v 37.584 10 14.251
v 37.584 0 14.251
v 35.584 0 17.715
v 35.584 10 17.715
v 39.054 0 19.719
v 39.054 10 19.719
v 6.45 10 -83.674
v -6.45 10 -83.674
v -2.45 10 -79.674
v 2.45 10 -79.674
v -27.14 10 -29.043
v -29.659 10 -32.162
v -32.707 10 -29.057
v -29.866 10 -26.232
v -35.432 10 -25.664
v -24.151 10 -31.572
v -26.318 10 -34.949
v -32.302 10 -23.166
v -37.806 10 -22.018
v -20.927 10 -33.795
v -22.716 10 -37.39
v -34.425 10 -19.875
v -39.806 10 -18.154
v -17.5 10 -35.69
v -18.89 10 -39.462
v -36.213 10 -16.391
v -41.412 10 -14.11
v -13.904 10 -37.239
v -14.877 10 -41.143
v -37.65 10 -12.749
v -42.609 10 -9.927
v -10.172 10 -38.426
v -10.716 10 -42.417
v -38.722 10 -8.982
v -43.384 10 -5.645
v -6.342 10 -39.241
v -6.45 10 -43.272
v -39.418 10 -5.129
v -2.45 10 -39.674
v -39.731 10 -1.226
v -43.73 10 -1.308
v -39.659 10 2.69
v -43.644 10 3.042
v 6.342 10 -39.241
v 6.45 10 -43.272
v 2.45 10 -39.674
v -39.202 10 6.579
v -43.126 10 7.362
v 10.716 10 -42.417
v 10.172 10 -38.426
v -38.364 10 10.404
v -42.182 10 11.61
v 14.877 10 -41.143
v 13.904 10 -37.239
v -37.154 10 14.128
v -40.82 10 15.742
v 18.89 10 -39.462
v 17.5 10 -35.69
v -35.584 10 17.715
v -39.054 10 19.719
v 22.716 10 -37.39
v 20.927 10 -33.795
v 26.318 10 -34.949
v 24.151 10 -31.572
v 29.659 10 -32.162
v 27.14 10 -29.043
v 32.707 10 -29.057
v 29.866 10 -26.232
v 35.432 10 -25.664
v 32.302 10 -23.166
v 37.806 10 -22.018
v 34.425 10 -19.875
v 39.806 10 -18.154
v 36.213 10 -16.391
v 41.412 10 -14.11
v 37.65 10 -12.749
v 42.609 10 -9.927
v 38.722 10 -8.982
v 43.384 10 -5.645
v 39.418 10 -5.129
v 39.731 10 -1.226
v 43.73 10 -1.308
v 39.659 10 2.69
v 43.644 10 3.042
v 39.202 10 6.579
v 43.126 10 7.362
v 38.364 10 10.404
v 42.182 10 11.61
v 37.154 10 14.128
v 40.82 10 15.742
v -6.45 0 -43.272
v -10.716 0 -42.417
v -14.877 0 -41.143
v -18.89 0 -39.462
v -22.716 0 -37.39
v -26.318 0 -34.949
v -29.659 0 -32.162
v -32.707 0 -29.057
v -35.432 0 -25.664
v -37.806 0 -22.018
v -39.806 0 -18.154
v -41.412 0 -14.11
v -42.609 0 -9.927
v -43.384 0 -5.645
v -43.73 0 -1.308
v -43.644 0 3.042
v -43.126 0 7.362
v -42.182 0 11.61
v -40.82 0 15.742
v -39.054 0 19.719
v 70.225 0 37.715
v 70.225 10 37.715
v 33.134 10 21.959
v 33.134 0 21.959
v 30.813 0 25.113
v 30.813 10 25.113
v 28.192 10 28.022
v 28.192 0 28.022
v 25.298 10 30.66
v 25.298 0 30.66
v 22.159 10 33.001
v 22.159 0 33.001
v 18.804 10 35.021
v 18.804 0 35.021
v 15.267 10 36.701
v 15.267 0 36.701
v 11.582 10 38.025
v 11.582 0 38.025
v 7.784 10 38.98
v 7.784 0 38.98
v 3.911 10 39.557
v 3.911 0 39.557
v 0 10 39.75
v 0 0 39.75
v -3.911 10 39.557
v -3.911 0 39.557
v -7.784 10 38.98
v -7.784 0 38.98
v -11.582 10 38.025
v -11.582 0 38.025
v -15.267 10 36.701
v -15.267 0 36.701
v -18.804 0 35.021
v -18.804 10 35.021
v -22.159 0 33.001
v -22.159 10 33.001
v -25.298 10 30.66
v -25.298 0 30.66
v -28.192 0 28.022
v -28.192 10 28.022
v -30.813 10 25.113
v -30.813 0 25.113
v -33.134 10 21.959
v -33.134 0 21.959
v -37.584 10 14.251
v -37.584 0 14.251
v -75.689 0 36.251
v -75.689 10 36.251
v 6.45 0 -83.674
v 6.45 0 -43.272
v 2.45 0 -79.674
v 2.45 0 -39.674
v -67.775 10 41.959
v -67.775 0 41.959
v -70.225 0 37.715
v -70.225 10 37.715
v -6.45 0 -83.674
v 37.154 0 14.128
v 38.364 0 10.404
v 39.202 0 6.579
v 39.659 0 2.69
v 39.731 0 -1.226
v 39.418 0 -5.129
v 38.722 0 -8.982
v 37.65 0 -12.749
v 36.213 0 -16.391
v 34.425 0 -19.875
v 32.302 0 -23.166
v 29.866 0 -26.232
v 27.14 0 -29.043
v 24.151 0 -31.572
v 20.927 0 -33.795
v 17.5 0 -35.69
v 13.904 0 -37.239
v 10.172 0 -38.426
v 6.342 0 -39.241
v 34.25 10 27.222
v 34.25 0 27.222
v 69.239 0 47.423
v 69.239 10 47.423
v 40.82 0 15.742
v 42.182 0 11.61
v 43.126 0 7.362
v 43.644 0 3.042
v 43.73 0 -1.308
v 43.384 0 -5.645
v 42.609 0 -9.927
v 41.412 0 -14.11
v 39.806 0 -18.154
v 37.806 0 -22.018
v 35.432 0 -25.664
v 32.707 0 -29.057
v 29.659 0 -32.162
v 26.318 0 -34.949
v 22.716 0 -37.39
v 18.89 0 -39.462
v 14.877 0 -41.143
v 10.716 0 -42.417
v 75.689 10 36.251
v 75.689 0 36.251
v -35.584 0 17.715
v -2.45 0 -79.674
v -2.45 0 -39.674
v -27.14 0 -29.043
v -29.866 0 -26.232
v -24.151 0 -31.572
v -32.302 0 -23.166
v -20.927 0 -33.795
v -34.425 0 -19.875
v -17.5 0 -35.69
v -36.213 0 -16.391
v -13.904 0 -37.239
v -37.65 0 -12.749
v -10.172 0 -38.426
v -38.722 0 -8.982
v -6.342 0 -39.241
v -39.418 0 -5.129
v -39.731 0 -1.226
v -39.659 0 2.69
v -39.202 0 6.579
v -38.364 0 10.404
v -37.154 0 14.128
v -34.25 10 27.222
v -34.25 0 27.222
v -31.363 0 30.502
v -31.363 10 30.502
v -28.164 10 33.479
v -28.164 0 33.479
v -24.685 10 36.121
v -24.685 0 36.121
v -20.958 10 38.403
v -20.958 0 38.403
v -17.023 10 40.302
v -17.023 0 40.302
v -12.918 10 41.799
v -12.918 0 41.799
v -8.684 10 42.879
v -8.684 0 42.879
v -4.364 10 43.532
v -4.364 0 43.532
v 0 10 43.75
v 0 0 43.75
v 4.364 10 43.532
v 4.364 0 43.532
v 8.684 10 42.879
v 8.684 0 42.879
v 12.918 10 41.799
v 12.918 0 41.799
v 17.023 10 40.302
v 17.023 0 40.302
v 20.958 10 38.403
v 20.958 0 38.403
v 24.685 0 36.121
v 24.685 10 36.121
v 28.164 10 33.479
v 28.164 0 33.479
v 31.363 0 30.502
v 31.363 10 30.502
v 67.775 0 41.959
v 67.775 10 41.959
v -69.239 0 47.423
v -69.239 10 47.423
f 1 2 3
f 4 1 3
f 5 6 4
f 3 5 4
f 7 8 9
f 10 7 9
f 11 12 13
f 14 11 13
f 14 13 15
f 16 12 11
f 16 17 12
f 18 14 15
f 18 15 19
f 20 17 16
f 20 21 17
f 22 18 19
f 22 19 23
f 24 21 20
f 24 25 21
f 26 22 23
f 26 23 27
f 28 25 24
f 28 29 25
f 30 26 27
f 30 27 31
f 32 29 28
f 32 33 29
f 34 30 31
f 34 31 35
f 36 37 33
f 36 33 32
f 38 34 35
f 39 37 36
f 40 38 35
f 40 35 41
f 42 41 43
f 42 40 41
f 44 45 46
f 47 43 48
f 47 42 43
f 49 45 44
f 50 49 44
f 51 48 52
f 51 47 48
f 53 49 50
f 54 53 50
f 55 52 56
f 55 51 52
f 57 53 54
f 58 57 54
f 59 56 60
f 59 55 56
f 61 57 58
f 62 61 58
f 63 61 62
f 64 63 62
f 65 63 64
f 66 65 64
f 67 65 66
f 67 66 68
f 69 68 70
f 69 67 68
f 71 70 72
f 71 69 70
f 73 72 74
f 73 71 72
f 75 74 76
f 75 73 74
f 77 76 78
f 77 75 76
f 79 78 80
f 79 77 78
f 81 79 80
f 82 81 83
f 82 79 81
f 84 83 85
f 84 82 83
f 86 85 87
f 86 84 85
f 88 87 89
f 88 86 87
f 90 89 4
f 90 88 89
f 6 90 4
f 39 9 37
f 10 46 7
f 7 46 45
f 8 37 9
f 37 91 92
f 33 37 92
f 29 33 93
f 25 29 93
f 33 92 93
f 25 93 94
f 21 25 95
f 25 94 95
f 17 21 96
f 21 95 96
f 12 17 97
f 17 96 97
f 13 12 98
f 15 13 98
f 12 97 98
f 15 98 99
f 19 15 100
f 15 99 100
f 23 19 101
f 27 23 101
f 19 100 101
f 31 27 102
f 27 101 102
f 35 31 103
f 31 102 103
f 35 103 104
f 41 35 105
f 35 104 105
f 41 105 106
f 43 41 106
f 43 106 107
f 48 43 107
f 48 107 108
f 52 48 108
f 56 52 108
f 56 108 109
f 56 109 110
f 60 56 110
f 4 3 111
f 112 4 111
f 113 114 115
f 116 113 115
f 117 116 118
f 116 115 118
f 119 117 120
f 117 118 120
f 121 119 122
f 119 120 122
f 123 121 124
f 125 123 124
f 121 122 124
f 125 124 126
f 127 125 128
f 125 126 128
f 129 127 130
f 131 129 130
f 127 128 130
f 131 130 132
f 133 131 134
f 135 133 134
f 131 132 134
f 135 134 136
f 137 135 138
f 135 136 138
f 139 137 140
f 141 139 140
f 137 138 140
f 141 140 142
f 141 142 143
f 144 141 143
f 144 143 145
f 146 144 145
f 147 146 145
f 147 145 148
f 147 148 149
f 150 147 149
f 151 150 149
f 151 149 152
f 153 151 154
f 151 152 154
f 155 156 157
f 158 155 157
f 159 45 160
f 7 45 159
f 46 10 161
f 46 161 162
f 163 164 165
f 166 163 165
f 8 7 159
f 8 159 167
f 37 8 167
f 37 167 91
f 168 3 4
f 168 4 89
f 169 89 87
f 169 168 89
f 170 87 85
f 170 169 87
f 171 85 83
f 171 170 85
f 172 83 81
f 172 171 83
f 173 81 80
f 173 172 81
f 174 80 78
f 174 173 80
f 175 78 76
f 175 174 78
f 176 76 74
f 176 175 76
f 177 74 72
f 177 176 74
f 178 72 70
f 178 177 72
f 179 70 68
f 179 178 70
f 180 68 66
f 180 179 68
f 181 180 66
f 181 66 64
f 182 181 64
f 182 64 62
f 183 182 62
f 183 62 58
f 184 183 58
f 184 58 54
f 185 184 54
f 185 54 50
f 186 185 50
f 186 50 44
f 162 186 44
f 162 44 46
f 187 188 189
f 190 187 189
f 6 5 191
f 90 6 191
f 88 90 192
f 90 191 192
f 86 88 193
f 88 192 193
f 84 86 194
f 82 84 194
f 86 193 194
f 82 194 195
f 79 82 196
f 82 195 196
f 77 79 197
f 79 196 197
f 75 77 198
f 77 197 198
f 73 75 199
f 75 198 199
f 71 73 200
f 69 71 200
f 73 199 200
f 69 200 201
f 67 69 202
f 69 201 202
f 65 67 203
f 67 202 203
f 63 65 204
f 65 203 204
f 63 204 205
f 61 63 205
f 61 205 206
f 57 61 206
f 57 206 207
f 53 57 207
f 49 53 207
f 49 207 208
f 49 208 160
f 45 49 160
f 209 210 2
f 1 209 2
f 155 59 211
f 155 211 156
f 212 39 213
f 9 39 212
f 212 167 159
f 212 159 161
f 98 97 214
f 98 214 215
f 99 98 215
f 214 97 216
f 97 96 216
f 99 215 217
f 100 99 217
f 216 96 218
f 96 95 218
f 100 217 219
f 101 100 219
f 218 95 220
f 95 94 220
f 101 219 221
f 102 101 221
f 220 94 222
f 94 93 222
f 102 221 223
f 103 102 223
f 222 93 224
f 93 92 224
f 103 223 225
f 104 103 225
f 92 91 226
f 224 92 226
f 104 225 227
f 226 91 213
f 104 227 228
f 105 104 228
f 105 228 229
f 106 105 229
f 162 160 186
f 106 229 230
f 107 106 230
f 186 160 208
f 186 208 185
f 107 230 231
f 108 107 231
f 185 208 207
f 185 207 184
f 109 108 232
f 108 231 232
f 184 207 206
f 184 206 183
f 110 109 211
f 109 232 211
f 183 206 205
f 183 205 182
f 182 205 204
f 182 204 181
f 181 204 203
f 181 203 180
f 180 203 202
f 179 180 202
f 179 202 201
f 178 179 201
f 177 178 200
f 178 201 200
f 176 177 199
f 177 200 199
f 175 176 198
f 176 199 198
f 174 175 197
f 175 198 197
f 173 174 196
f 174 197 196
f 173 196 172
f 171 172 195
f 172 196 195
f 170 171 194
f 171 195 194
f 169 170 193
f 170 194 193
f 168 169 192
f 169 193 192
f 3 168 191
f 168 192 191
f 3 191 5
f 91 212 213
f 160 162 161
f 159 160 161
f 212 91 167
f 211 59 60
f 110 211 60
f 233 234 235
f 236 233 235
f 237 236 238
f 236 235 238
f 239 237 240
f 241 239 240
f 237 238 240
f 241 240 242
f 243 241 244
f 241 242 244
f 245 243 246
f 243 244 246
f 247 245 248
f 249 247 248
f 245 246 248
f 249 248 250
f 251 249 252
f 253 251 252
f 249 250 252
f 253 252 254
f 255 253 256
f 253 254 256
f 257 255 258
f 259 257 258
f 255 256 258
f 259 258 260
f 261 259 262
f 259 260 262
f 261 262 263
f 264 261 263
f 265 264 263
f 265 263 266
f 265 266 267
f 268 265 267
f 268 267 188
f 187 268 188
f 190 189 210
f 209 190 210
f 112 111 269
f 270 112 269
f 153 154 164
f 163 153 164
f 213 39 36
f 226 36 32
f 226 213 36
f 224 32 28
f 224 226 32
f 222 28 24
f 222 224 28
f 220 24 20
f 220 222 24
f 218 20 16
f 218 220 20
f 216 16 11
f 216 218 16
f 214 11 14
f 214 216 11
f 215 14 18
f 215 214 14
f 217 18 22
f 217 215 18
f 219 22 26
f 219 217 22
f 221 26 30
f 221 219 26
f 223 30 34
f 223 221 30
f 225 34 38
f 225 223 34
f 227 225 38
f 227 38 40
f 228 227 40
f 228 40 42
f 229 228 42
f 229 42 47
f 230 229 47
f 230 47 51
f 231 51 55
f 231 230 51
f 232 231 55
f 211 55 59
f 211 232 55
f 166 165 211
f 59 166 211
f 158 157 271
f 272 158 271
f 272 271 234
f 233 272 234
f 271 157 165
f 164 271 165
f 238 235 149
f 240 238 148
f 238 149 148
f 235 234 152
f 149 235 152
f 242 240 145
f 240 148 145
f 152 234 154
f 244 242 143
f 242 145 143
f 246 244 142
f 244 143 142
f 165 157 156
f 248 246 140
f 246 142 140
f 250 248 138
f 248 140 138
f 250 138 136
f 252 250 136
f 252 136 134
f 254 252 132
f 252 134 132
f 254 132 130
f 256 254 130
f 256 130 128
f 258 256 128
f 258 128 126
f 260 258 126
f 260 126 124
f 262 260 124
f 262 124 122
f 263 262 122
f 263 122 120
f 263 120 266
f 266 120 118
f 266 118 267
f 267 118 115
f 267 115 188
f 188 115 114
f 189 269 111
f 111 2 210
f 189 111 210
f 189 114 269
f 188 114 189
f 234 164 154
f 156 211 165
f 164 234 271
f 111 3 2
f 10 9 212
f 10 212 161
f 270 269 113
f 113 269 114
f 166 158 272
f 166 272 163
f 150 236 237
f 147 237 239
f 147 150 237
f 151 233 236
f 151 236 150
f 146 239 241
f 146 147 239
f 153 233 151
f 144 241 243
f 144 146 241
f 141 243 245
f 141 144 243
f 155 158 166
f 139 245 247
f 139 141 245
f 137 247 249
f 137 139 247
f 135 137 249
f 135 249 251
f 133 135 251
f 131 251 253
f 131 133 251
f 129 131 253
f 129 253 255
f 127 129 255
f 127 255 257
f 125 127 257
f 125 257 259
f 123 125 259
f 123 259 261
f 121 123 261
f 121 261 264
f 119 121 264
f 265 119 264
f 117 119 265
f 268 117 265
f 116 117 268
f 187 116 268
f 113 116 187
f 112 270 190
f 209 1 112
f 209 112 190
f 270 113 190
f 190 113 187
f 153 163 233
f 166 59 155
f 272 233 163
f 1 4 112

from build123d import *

# Parameters (mm, degrees)
SKETCH1_R           = 43.75
SKETCH1_R_2         = 39.75
BOSS_EXTRUDE1_DEPTH = 10
CUT_EXTRUDE1_DEPTH  = 63.674755684
BOSS_EXTRUDE2_DEPTH = 10
CIRPATTERN1_DEPTH   = 10
CIRPATTERN1_2_DEPTH = 10


# Read off the part's stored shape, not the designer's step: CirPattern1
with BuildPart() as part:
    # Sketch1 → Boss-Extrude1 (new body)
    with BuildSketch(Plane(origin=(0, 0, 0), x_dir=(1, 0, 0), z_dir=(0, 1, 0))):
        with Locations(Location((0, 0, 0), (0, 0, 270))):
            Circle(SKETCH1_R)
        with Locations(Location((0, 0, 0), (0, 0, 270))):
            Circle(SKETCH1_R_2, mode=Mode.SUBTRACT)
    extrude(amount=BOSS_EXTRUDE1_DEPTH)

    # Sketch2 → Cut-Extrude1 (cut, through all)
    with BuildSketch(Plane(origin=(0, 10, 0), x_dir=(1, 0, 0), z_dir=(0, 1, 0))):
        Polygon((0, 37.83827082), (-2.45, 37.83827082), (-2.45, 50.118406455), (1.287432584, 50.118406455), (2.45, 50.118406455), (2.45, 37.83827082), align=None)
    extrude(amount=-CUT_EXTRUDE1_DEPTH, mode=Mode.SUBTRACT)

    # Sketch3 → Boss-Extrude2 (add, through all)
    with BuildSketch(Plane(origin=(0, 10, 0), x_dir=(1, 0, 0), z_dir=(0, 1, 0))):
        Polygon((-2.45, 39.674425012), (-2.45, 79.674425012), (2.45, 79.674425012), (2.45, 39.674425012), (6.45, 39.674425012), (6.45, 83.674425012), (-6.45, 83.674425012), (-6.45, 39.674425012), align=None)
    extrude(amount=-BOSS_EXTRUDE2_DEPTH)

    # CirPattern1 outline → CirPattern1 (cut)
    with BuildSketch(Plane(origin=(0, 0, 0), x_dir=(1, 0, 0), z_dir=(0, 1, 0))):
        with BuildLine():
            ThreePointArc((-39.054155423, -19.718910827), (0, -43.75), (39.054155423, -19.718910827))
            Line((39.054155423, -19.718910827), (35.584059941, -17.715450267))
            ThreePointArc((35.584059941, -17.715450267), (0, -39.75), (-35.584059941, -17.715450267))
            Line((-35.584059941, -17.715450267), (-39.054155423, -19.718910827))
        make_face()
    extrude(amount=CIRPATTERN1_DEPTH, mode=Mode.SUBTRACT)


with BuildPart() as body_2:
    # CirPattern1 2 outline → CirPattern1 2 (new body)
    with BuildSketch(Plane(origin=(0, 0, 0), x_dir=(1, 0, 0), z_dir=(0, 1, 0))):
        with BuildLine():
            Line((67.775076092, -41.958974745), (33.134059941, -21.958974745))
            ThreePointArc((33.134059941, -21.958974745), (0, -39.75), (-33.134059941, -21.958974745))
            Line((-33.134059941, -21.958974745), (-67.775076092, -41.958974745))
            Line((-67.775076092, -41.958974745), (-70.225076092, -37.715450267))
            Line((-70.225076092, -37.715450267), (-35.584059941, -17.715450267))
            Line((-35.584059941, -17.715450267), (-37.584059941, -14.251348651))
            Line((-37.584059941, -14.251348651), (-75.689177707, -36.251348651))
            Line((-75.689177707, -36.251348651), (-69.239177707, -47.42307636))
            Line((-69.239177707, -47.42307636), (-34.249591392, -27.221829282))
            ThreePointArc((-34.249591392, -27.221829282), (0, -43.75), (34.249591392, -27.221829282))
            Line((34.249591392, -27.221829282), (69.239177707, -47.42307636))
            Line((69.239177707, -47.42307636), (75.689177707, -36.251348651))
            Line((75.689177707, -36.251348651), (37.584059941, -14.251348651))
            Line((37.584059941, -14.251348651), (35.584059941, -17.715450267))
            Line((35.584059941, -17.715450267), (70.225076092, -37.715450267))
            Line((70.225076092, -37.715450267), (67.775076092, -41.958974745))
        make_face()
    extrude(amount=CIRPATTERN1_2_DEPTH)


solid = Compound([part.part, body_2.part])
